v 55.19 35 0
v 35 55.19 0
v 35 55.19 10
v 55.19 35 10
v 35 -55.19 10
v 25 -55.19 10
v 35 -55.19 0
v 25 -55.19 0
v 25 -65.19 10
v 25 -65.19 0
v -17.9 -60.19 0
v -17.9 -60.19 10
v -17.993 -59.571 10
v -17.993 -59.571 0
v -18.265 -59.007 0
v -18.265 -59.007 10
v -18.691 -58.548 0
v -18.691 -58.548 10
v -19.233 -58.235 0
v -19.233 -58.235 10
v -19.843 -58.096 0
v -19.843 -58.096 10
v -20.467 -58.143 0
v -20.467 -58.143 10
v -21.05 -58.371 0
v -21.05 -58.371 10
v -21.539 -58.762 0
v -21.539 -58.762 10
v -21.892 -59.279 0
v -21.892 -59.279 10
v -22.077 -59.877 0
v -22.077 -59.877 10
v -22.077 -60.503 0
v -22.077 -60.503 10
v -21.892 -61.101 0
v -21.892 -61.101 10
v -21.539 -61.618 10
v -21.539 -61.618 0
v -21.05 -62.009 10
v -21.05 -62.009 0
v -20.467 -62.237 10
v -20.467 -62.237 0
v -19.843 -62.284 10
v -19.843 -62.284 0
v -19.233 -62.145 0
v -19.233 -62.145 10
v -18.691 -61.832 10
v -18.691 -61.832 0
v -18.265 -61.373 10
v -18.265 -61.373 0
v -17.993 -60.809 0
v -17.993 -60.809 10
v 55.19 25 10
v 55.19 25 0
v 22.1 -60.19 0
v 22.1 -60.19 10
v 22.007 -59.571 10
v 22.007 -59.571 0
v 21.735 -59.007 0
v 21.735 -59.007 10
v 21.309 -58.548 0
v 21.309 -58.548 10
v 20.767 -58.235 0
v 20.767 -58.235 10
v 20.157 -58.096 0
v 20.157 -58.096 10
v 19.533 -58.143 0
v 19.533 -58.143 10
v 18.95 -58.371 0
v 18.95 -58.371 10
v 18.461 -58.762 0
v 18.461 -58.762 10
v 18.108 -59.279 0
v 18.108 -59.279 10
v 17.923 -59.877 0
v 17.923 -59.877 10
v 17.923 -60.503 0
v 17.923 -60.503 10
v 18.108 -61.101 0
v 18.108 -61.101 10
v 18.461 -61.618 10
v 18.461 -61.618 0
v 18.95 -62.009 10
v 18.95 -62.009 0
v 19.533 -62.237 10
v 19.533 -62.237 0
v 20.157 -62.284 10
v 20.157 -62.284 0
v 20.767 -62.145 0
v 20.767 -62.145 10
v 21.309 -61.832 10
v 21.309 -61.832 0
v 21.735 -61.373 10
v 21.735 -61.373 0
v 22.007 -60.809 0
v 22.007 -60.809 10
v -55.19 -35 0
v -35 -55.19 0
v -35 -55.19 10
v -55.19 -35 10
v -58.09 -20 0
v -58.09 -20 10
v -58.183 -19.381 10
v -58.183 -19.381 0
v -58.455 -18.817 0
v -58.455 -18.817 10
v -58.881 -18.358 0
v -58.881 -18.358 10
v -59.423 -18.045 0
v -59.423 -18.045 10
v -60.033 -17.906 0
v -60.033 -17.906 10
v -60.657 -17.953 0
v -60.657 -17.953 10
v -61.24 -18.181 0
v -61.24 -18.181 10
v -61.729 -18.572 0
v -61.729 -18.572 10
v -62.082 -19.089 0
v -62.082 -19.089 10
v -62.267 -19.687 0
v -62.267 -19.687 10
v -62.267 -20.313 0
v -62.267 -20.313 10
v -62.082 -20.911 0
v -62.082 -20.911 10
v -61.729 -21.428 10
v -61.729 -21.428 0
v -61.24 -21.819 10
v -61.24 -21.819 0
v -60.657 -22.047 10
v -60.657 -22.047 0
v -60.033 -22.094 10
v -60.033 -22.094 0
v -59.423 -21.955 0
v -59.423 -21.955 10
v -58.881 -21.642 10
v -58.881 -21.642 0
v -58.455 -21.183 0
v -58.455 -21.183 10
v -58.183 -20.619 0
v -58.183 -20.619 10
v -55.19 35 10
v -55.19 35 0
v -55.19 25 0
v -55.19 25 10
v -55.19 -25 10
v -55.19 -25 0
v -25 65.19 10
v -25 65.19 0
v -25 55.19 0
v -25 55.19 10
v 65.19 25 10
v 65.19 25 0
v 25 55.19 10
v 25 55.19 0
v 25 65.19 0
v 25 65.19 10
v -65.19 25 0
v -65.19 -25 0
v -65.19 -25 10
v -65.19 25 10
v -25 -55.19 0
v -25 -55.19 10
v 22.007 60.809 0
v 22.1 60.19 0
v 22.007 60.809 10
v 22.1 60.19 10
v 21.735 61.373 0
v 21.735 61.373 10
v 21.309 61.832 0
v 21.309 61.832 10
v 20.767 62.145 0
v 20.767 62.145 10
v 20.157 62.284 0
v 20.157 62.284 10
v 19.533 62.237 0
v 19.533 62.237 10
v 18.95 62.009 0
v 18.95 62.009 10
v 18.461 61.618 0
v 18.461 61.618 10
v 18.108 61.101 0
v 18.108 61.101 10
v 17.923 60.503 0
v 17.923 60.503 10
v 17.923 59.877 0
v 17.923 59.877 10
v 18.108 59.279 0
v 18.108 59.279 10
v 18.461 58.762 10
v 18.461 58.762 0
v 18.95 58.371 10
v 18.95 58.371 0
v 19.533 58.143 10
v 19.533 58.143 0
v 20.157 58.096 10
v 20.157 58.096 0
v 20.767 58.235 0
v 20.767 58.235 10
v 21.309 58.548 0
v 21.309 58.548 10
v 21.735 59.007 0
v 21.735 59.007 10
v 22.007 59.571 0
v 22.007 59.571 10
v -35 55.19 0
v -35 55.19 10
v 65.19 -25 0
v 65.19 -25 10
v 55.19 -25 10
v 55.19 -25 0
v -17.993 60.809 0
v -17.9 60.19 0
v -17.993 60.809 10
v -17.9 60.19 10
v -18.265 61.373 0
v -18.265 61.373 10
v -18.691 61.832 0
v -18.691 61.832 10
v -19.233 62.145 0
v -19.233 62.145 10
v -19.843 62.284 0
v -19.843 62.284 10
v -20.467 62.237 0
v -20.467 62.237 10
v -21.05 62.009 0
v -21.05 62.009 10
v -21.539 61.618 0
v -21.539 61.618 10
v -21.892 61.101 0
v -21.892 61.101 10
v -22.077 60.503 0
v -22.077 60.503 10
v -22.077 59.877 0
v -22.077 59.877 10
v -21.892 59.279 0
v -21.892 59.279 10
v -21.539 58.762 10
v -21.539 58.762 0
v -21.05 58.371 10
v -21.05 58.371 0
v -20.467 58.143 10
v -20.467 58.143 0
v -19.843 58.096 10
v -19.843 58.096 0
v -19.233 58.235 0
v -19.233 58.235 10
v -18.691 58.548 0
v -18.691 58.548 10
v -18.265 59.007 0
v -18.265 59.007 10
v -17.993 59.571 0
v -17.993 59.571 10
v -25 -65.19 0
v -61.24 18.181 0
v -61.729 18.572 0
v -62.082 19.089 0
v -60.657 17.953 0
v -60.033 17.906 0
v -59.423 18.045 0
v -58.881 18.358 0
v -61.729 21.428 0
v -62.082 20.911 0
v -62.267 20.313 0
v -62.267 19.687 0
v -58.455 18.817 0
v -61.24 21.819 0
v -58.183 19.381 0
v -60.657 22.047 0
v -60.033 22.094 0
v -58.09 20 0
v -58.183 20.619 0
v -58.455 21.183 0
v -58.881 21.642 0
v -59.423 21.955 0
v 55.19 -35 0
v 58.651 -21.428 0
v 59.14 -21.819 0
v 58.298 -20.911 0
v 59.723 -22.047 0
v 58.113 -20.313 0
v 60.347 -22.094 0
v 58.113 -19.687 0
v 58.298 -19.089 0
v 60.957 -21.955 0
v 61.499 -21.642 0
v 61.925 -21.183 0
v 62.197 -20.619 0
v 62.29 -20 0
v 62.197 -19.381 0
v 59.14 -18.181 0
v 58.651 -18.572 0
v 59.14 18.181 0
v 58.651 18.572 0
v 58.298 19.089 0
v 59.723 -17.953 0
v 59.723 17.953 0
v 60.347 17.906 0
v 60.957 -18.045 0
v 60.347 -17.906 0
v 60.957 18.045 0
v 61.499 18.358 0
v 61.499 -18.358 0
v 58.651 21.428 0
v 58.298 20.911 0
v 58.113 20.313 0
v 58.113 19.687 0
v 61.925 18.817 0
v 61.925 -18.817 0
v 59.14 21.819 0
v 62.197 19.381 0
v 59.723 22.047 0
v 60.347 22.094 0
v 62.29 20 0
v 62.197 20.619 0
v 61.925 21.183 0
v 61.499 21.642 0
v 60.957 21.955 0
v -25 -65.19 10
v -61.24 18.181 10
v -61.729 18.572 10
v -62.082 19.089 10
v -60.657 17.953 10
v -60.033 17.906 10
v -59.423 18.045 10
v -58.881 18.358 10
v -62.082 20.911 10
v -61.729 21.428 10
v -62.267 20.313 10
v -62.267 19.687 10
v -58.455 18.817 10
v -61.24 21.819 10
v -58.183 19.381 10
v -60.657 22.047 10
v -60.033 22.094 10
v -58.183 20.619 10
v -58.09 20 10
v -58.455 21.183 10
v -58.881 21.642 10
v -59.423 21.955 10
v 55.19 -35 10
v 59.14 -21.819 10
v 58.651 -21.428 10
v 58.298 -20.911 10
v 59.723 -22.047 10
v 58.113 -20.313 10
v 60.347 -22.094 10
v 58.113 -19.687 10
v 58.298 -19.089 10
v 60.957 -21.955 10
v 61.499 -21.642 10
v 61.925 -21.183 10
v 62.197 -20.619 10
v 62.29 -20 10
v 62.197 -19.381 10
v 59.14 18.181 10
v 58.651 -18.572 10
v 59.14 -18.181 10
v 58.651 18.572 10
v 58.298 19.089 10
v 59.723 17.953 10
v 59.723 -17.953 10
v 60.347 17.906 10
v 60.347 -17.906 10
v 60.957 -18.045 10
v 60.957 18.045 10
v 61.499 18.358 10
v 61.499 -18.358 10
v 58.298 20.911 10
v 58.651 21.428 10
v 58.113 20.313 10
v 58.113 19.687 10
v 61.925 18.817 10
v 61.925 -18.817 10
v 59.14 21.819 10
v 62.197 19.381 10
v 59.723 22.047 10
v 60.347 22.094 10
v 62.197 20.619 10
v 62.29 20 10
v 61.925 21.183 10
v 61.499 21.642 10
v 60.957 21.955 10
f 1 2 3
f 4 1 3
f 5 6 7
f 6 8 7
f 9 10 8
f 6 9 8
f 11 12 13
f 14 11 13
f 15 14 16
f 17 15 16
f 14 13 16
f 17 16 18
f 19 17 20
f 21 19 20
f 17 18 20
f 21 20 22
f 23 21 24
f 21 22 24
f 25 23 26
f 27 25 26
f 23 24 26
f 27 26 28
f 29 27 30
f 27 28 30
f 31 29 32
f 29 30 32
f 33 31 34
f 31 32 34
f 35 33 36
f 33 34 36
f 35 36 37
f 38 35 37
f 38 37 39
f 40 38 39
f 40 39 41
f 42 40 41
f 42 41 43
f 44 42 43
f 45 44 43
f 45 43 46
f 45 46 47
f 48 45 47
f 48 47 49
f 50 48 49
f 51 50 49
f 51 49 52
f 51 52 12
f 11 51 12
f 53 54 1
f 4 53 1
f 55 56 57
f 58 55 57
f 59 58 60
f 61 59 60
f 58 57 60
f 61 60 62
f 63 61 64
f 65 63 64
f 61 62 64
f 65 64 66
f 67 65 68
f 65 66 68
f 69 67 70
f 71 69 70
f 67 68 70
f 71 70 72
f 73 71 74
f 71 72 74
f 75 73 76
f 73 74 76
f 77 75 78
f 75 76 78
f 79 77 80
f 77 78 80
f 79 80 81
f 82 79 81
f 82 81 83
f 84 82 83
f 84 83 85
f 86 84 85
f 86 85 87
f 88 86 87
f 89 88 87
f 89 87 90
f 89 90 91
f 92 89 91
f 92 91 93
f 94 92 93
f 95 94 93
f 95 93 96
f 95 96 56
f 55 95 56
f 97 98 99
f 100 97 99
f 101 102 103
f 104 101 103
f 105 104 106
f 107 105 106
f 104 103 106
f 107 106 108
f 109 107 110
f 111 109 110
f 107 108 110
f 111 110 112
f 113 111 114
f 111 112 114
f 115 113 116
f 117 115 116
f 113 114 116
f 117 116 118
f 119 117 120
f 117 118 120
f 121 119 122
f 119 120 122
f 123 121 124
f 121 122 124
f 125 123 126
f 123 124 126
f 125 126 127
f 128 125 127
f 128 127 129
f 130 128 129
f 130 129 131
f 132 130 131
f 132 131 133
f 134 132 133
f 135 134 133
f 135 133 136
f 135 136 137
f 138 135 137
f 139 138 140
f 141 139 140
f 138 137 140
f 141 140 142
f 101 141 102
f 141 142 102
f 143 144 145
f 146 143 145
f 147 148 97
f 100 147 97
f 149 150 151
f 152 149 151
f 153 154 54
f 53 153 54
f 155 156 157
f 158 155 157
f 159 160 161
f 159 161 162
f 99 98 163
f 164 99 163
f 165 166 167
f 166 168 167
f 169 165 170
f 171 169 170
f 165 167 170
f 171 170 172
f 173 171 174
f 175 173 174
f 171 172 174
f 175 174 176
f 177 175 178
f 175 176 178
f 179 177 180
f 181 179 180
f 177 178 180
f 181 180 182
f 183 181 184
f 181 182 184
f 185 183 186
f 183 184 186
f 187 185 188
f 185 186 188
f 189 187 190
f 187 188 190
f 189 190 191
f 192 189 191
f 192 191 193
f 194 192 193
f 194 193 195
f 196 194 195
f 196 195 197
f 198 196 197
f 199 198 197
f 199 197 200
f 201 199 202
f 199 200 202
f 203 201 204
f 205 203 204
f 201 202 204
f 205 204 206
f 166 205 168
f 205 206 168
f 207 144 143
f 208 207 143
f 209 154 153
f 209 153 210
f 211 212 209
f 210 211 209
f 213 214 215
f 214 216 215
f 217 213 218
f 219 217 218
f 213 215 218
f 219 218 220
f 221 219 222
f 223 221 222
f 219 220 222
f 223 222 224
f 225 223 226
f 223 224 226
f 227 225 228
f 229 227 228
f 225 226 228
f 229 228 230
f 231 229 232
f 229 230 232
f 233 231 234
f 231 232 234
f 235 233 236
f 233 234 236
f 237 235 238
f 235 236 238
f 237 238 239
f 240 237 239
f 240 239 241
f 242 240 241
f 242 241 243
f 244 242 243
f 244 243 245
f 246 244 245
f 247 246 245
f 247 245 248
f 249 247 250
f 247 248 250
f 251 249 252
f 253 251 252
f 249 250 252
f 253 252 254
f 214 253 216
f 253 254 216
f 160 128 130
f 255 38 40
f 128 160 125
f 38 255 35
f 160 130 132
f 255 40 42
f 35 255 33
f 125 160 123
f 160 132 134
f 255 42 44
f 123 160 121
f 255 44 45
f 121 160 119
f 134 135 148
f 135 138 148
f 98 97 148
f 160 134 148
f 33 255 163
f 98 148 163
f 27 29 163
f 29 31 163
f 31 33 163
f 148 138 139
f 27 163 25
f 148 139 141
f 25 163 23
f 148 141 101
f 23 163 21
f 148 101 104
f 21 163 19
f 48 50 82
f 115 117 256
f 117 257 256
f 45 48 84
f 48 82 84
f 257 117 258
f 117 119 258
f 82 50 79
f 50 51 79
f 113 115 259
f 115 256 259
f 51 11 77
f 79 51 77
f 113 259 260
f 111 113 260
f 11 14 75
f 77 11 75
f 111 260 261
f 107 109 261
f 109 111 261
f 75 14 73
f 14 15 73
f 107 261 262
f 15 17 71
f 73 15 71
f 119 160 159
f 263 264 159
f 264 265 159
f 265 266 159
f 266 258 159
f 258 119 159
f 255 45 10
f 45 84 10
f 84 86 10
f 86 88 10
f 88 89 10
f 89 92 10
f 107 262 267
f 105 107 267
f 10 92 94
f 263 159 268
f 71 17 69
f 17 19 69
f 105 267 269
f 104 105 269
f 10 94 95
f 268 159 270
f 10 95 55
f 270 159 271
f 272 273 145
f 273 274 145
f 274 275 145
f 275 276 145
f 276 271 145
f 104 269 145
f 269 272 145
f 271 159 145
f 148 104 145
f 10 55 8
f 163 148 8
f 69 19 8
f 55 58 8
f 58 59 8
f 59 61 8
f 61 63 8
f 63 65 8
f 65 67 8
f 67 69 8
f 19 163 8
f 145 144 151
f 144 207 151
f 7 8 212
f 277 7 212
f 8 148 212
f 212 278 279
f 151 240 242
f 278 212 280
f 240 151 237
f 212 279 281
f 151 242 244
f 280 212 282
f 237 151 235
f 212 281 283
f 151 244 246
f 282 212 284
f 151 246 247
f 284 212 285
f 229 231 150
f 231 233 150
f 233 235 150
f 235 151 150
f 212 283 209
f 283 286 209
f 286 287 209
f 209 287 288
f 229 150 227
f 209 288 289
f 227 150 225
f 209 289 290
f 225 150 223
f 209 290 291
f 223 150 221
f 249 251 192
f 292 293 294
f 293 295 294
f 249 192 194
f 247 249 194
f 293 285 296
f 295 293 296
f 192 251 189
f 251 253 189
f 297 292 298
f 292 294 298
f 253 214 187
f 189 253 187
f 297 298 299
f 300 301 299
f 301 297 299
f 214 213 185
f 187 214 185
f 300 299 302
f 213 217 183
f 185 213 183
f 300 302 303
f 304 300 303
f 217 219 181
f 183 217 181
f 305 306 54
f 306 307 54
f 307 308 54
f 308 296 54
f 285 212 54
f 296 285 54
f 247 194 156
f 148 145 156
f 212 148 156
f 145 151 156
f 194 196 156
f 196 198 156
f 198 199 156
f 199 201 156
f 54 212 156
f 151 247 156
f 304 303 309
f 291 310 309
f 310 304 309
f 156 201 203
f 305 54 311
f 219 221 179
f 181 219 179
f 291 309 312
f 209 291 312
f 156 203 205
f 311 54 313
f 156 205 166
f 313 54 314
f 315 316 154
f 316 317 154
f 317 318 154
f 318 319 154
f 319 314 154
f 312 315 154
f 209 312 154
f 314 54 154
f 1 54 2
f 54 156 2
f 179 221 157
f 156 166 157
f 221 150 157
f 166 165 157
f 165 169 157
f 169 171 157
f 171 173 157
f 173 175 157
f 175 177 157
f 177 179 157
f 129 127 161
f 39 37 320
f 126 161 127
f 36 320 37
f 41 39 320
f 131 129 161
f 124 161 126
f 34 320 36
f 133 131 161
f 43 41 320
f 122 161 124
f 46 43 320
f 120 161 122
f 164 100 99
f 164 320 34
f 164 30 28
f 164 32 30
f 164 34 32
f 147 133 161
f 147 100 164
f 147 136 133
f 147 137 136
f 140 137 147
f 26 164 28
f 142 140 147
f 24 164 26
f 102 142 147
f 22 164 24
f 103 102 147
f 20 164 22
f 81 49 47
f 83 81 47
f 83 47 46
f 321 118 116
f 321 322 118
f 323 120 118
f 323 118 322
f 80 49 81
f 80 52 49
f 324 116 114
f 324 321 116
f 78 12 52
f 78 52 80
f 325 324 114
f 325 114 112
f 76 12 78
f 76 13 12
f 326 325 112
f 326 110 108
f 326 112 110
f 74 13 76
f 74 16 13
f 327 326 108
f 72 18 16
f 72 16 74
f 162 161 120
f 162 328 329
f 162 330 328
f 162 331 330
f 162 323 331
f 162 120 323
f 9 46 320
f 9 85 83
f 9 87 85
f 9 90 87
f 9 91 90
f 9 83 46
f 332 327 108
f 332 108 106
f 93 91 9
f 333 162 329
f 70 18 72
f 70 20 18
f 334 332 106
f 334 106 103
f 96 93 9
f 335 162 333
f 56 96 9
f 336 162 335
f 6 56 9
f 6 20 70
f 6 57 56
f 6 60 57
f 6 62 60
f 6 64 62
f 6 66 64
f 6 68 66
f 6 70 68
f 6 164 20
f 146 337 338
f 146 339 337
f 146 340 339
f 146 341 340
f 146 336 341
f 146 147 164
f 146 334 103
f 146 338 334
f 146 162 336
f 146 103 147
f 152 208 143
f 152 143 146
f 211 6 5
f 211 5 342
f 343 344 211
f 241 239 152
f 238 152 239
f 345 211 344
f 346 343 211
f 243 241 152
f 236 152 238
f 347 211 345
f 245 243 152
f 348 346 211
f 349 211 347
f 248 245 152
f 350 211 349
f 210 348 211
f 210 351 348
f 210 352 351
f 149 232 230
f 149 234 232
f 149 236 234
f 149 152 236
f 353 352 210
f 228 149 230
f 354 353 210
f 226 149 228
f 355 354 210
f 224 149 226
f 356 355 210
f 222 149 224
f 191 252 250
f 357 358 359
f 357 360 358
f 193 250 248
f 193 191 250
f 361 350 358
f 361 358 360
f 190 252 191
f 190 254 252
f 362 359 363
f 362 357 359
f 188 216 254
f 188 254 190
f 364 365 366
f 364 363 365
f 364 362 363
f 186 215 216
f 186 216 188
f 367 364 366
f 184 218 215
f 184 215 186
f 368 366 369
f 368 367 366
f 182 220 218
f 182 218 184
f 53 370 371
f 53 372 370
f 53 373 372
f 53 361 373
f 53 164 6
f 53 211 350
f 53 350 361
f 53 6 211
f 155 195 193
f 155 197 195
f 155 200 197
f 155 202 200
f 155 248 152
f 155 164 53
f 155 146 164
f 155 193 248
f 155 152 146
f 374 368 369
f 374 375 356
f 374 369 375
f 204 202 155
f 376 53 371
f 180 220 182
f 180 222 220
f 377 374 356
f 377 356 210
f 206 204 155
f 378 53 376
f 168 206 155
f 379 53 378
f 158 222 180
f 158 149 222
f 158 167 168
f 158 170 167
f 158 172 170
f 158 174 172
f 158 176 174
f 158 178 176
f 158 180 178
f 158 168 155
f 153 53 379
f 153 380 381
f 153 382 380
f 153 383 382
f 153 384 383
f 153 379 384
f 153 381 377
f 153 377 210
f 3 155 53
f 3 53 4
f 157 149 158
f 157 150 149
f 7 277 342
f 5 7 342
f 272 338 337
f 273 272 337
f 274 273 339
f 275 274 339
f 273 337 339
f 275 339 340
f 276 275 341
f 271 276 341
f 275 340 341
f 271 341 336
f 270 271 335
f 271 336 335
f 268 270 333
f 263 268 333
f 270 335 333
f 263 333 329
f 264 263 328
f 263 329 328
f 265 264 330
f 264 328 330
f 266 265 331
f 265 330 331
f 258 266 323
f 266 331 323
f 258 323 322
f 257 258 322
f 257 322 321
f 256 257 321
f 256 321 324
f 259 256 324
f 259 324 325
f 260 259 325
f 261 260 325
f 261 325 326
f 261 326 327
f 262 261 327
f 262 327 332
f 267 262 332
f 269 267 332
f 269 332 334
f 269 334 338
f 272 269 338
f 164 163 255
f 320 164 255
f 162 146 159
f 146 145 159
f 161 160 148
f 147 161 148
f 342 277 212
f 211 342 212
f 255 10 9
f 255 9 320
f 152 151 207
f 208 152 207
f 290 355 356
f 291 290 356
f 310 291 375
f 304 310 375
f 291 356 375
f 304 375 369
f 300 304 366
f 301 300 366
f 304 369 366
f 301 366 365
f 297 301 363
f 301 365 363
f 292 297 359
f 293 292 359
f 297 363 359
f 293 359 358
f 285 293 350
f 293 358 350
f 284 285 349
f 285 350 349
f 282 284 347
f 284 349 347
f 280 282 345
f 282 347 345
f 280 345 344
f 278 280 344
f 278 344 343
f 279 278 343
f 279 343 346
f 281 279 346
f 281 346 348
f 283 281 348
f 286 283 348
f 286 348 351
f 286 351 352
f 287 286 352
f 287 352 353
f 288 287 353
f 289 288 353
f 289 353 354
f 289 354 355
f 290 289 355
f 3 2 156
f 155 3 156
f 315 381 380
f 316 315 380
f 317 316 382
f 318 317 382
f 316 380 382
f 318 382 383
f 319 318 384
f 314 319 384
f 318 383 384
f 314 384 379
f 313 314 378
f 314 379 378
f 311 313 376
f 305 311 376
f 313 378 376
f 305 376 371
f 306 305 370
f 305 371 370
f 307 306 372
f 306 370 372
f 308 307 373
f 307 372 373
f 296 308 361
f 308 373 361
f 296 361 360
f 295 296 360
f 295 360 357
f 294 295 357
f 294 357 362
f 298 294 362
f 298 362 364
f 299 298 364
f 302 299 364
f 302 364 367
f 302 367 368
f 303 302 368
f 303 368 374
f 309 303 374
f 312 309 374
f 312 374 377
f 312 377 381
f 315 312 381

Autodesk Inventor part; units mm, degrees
ref_plane "YZ Plane" through (0, 0, 0) normal (1, 0, 0) x (0, 1, 0)
ref_plane "XZ Plane" through (0, 0, 0) normal (0, 1, 0) x (-1, 0, 0)
ref_plane "XY Plane" through (0, 0, 0) normal (0, 0, 1) x (1, 0, 0)
sketch "Sketch1" plane through (0, 0, 0) normal (0, 0, 1) x (1, 0, 0)
  line L0 (-25, 65.19) -> (25, 65.19)
  line L1 (65.19, 25) -> (65.19, -25)
  line L2 (25, -65.19) -> (-25, -65.19)
  line L3 (-65.19, -25) -> (-65.19, 25)
  line L4 (-50.6308, 50.6308) -> (50.6308, -50.6308) construction
  line L5 (50, 50) -> (-50, -50) construction
  line L6 (-40, 40) -> (-50.6308, 50.6308) construction
  line L7 (-25, 65.19) -> (-25, 55.19)
  line L8 (-25, 55.19) -> (-55.19, 55.19)
  line L9 (-55.19, 55.19) -> (-55.19, 25)
  line L10 (-55.19, 25) -> (-65.19, 25)
  line L11 (-55.19, -25) -> (-55.19, -55.19)
  line L12 (-65.19, -25) -> (-55.19, -25)
  line L13 (-55.19, -55.19) -> (-25, -55.19)
  line L14 (-25, -55.19) -> (-25, -65.19)
  line L15 (-40, -40) -> (-50.6308, -50.6308) construction
  line L16 (25, -55.19) -> (55.19, -55.19)
  line L17 (25, -65.19) -> (25, -55.19)
  line L18 (55.19, -55.19) -> (55.19, -25)
  line L19 (55.19, -25) -> (65.19, -25)
  line L20 (40, -40) -> (50.6308, -50.6308) construction
  line L21 (55.19, 25) -> (55.19, 55.19)
  line L22 (65.19, 25) -> (55.19, 25)
  line L23 (55.19, 55.19) -> (25, 55.19)
  line L24 (25, 55.19) -> (25, 65.19)
  line L25 (40, 40) -> (50.6308, 50.6308) construction
  line L26 (0, 0) -> (0, 26.4544)
  point P0 (-45.3154, 45.3154)
  point P1 (-45.3154, -45.3154)
  point P2 (45.3154, -45.3154)
  point P3 (45.3154, 45.3154)
  dimension "d9" = 130.38
  dimension "d17" = 360
  dimension "d19" = 10
  dimension "d24" = 10
  dimension "d39" = 50
extrude "Extrusion1" add sketch "Sketch1" along normal blind 10
chamfer "Chamfer1" distance 20.19 angle 45 4 edges at (-55.19, 55.19, 5) (55.19, 55.19, 5) (55.19, -55.19, 5) (-55.19, -55.19, 5)
sketch "Sketch3" plane through (0, 0, 10) normal (0, 0, 1) x (1, 0, 0)
  circle A0 centre (-20, 60.19) radius 2.1
  line L0 (25, 65.19) -> (-25, 65.19) projected
  line L1 (-25, 65.19) -> (-25, 55.19) projected
  line L2 (0, 0) -> (0, 11.031)
  line L3 (0, 0) -> (10.2151, 0)
  circle A1 centre (20, 60.19) radius 2.1
  circle A2 centre (-60.19, -20) radius 2.1
  circle A3 centre (-60.19, 20) radius 2.1
  circle A4 centre (20, -60.19) radius 2.1
  circle A5 centre (-20, -60.19) radius 2.1
  circle A6 centre (60.19, 20) radius 2.1
  circle A7 centre (60.19, -20) radius 2.1
  dimension "d30" = 4.2
  dimension "d31" = 5
  dimension "d32" = 5
  dimension "d35" = 360
extrude "Extrusion3" cut sketch "Sketch3" against normal through all
properties part number "gearbox_top" material "PMMA Plastic"
